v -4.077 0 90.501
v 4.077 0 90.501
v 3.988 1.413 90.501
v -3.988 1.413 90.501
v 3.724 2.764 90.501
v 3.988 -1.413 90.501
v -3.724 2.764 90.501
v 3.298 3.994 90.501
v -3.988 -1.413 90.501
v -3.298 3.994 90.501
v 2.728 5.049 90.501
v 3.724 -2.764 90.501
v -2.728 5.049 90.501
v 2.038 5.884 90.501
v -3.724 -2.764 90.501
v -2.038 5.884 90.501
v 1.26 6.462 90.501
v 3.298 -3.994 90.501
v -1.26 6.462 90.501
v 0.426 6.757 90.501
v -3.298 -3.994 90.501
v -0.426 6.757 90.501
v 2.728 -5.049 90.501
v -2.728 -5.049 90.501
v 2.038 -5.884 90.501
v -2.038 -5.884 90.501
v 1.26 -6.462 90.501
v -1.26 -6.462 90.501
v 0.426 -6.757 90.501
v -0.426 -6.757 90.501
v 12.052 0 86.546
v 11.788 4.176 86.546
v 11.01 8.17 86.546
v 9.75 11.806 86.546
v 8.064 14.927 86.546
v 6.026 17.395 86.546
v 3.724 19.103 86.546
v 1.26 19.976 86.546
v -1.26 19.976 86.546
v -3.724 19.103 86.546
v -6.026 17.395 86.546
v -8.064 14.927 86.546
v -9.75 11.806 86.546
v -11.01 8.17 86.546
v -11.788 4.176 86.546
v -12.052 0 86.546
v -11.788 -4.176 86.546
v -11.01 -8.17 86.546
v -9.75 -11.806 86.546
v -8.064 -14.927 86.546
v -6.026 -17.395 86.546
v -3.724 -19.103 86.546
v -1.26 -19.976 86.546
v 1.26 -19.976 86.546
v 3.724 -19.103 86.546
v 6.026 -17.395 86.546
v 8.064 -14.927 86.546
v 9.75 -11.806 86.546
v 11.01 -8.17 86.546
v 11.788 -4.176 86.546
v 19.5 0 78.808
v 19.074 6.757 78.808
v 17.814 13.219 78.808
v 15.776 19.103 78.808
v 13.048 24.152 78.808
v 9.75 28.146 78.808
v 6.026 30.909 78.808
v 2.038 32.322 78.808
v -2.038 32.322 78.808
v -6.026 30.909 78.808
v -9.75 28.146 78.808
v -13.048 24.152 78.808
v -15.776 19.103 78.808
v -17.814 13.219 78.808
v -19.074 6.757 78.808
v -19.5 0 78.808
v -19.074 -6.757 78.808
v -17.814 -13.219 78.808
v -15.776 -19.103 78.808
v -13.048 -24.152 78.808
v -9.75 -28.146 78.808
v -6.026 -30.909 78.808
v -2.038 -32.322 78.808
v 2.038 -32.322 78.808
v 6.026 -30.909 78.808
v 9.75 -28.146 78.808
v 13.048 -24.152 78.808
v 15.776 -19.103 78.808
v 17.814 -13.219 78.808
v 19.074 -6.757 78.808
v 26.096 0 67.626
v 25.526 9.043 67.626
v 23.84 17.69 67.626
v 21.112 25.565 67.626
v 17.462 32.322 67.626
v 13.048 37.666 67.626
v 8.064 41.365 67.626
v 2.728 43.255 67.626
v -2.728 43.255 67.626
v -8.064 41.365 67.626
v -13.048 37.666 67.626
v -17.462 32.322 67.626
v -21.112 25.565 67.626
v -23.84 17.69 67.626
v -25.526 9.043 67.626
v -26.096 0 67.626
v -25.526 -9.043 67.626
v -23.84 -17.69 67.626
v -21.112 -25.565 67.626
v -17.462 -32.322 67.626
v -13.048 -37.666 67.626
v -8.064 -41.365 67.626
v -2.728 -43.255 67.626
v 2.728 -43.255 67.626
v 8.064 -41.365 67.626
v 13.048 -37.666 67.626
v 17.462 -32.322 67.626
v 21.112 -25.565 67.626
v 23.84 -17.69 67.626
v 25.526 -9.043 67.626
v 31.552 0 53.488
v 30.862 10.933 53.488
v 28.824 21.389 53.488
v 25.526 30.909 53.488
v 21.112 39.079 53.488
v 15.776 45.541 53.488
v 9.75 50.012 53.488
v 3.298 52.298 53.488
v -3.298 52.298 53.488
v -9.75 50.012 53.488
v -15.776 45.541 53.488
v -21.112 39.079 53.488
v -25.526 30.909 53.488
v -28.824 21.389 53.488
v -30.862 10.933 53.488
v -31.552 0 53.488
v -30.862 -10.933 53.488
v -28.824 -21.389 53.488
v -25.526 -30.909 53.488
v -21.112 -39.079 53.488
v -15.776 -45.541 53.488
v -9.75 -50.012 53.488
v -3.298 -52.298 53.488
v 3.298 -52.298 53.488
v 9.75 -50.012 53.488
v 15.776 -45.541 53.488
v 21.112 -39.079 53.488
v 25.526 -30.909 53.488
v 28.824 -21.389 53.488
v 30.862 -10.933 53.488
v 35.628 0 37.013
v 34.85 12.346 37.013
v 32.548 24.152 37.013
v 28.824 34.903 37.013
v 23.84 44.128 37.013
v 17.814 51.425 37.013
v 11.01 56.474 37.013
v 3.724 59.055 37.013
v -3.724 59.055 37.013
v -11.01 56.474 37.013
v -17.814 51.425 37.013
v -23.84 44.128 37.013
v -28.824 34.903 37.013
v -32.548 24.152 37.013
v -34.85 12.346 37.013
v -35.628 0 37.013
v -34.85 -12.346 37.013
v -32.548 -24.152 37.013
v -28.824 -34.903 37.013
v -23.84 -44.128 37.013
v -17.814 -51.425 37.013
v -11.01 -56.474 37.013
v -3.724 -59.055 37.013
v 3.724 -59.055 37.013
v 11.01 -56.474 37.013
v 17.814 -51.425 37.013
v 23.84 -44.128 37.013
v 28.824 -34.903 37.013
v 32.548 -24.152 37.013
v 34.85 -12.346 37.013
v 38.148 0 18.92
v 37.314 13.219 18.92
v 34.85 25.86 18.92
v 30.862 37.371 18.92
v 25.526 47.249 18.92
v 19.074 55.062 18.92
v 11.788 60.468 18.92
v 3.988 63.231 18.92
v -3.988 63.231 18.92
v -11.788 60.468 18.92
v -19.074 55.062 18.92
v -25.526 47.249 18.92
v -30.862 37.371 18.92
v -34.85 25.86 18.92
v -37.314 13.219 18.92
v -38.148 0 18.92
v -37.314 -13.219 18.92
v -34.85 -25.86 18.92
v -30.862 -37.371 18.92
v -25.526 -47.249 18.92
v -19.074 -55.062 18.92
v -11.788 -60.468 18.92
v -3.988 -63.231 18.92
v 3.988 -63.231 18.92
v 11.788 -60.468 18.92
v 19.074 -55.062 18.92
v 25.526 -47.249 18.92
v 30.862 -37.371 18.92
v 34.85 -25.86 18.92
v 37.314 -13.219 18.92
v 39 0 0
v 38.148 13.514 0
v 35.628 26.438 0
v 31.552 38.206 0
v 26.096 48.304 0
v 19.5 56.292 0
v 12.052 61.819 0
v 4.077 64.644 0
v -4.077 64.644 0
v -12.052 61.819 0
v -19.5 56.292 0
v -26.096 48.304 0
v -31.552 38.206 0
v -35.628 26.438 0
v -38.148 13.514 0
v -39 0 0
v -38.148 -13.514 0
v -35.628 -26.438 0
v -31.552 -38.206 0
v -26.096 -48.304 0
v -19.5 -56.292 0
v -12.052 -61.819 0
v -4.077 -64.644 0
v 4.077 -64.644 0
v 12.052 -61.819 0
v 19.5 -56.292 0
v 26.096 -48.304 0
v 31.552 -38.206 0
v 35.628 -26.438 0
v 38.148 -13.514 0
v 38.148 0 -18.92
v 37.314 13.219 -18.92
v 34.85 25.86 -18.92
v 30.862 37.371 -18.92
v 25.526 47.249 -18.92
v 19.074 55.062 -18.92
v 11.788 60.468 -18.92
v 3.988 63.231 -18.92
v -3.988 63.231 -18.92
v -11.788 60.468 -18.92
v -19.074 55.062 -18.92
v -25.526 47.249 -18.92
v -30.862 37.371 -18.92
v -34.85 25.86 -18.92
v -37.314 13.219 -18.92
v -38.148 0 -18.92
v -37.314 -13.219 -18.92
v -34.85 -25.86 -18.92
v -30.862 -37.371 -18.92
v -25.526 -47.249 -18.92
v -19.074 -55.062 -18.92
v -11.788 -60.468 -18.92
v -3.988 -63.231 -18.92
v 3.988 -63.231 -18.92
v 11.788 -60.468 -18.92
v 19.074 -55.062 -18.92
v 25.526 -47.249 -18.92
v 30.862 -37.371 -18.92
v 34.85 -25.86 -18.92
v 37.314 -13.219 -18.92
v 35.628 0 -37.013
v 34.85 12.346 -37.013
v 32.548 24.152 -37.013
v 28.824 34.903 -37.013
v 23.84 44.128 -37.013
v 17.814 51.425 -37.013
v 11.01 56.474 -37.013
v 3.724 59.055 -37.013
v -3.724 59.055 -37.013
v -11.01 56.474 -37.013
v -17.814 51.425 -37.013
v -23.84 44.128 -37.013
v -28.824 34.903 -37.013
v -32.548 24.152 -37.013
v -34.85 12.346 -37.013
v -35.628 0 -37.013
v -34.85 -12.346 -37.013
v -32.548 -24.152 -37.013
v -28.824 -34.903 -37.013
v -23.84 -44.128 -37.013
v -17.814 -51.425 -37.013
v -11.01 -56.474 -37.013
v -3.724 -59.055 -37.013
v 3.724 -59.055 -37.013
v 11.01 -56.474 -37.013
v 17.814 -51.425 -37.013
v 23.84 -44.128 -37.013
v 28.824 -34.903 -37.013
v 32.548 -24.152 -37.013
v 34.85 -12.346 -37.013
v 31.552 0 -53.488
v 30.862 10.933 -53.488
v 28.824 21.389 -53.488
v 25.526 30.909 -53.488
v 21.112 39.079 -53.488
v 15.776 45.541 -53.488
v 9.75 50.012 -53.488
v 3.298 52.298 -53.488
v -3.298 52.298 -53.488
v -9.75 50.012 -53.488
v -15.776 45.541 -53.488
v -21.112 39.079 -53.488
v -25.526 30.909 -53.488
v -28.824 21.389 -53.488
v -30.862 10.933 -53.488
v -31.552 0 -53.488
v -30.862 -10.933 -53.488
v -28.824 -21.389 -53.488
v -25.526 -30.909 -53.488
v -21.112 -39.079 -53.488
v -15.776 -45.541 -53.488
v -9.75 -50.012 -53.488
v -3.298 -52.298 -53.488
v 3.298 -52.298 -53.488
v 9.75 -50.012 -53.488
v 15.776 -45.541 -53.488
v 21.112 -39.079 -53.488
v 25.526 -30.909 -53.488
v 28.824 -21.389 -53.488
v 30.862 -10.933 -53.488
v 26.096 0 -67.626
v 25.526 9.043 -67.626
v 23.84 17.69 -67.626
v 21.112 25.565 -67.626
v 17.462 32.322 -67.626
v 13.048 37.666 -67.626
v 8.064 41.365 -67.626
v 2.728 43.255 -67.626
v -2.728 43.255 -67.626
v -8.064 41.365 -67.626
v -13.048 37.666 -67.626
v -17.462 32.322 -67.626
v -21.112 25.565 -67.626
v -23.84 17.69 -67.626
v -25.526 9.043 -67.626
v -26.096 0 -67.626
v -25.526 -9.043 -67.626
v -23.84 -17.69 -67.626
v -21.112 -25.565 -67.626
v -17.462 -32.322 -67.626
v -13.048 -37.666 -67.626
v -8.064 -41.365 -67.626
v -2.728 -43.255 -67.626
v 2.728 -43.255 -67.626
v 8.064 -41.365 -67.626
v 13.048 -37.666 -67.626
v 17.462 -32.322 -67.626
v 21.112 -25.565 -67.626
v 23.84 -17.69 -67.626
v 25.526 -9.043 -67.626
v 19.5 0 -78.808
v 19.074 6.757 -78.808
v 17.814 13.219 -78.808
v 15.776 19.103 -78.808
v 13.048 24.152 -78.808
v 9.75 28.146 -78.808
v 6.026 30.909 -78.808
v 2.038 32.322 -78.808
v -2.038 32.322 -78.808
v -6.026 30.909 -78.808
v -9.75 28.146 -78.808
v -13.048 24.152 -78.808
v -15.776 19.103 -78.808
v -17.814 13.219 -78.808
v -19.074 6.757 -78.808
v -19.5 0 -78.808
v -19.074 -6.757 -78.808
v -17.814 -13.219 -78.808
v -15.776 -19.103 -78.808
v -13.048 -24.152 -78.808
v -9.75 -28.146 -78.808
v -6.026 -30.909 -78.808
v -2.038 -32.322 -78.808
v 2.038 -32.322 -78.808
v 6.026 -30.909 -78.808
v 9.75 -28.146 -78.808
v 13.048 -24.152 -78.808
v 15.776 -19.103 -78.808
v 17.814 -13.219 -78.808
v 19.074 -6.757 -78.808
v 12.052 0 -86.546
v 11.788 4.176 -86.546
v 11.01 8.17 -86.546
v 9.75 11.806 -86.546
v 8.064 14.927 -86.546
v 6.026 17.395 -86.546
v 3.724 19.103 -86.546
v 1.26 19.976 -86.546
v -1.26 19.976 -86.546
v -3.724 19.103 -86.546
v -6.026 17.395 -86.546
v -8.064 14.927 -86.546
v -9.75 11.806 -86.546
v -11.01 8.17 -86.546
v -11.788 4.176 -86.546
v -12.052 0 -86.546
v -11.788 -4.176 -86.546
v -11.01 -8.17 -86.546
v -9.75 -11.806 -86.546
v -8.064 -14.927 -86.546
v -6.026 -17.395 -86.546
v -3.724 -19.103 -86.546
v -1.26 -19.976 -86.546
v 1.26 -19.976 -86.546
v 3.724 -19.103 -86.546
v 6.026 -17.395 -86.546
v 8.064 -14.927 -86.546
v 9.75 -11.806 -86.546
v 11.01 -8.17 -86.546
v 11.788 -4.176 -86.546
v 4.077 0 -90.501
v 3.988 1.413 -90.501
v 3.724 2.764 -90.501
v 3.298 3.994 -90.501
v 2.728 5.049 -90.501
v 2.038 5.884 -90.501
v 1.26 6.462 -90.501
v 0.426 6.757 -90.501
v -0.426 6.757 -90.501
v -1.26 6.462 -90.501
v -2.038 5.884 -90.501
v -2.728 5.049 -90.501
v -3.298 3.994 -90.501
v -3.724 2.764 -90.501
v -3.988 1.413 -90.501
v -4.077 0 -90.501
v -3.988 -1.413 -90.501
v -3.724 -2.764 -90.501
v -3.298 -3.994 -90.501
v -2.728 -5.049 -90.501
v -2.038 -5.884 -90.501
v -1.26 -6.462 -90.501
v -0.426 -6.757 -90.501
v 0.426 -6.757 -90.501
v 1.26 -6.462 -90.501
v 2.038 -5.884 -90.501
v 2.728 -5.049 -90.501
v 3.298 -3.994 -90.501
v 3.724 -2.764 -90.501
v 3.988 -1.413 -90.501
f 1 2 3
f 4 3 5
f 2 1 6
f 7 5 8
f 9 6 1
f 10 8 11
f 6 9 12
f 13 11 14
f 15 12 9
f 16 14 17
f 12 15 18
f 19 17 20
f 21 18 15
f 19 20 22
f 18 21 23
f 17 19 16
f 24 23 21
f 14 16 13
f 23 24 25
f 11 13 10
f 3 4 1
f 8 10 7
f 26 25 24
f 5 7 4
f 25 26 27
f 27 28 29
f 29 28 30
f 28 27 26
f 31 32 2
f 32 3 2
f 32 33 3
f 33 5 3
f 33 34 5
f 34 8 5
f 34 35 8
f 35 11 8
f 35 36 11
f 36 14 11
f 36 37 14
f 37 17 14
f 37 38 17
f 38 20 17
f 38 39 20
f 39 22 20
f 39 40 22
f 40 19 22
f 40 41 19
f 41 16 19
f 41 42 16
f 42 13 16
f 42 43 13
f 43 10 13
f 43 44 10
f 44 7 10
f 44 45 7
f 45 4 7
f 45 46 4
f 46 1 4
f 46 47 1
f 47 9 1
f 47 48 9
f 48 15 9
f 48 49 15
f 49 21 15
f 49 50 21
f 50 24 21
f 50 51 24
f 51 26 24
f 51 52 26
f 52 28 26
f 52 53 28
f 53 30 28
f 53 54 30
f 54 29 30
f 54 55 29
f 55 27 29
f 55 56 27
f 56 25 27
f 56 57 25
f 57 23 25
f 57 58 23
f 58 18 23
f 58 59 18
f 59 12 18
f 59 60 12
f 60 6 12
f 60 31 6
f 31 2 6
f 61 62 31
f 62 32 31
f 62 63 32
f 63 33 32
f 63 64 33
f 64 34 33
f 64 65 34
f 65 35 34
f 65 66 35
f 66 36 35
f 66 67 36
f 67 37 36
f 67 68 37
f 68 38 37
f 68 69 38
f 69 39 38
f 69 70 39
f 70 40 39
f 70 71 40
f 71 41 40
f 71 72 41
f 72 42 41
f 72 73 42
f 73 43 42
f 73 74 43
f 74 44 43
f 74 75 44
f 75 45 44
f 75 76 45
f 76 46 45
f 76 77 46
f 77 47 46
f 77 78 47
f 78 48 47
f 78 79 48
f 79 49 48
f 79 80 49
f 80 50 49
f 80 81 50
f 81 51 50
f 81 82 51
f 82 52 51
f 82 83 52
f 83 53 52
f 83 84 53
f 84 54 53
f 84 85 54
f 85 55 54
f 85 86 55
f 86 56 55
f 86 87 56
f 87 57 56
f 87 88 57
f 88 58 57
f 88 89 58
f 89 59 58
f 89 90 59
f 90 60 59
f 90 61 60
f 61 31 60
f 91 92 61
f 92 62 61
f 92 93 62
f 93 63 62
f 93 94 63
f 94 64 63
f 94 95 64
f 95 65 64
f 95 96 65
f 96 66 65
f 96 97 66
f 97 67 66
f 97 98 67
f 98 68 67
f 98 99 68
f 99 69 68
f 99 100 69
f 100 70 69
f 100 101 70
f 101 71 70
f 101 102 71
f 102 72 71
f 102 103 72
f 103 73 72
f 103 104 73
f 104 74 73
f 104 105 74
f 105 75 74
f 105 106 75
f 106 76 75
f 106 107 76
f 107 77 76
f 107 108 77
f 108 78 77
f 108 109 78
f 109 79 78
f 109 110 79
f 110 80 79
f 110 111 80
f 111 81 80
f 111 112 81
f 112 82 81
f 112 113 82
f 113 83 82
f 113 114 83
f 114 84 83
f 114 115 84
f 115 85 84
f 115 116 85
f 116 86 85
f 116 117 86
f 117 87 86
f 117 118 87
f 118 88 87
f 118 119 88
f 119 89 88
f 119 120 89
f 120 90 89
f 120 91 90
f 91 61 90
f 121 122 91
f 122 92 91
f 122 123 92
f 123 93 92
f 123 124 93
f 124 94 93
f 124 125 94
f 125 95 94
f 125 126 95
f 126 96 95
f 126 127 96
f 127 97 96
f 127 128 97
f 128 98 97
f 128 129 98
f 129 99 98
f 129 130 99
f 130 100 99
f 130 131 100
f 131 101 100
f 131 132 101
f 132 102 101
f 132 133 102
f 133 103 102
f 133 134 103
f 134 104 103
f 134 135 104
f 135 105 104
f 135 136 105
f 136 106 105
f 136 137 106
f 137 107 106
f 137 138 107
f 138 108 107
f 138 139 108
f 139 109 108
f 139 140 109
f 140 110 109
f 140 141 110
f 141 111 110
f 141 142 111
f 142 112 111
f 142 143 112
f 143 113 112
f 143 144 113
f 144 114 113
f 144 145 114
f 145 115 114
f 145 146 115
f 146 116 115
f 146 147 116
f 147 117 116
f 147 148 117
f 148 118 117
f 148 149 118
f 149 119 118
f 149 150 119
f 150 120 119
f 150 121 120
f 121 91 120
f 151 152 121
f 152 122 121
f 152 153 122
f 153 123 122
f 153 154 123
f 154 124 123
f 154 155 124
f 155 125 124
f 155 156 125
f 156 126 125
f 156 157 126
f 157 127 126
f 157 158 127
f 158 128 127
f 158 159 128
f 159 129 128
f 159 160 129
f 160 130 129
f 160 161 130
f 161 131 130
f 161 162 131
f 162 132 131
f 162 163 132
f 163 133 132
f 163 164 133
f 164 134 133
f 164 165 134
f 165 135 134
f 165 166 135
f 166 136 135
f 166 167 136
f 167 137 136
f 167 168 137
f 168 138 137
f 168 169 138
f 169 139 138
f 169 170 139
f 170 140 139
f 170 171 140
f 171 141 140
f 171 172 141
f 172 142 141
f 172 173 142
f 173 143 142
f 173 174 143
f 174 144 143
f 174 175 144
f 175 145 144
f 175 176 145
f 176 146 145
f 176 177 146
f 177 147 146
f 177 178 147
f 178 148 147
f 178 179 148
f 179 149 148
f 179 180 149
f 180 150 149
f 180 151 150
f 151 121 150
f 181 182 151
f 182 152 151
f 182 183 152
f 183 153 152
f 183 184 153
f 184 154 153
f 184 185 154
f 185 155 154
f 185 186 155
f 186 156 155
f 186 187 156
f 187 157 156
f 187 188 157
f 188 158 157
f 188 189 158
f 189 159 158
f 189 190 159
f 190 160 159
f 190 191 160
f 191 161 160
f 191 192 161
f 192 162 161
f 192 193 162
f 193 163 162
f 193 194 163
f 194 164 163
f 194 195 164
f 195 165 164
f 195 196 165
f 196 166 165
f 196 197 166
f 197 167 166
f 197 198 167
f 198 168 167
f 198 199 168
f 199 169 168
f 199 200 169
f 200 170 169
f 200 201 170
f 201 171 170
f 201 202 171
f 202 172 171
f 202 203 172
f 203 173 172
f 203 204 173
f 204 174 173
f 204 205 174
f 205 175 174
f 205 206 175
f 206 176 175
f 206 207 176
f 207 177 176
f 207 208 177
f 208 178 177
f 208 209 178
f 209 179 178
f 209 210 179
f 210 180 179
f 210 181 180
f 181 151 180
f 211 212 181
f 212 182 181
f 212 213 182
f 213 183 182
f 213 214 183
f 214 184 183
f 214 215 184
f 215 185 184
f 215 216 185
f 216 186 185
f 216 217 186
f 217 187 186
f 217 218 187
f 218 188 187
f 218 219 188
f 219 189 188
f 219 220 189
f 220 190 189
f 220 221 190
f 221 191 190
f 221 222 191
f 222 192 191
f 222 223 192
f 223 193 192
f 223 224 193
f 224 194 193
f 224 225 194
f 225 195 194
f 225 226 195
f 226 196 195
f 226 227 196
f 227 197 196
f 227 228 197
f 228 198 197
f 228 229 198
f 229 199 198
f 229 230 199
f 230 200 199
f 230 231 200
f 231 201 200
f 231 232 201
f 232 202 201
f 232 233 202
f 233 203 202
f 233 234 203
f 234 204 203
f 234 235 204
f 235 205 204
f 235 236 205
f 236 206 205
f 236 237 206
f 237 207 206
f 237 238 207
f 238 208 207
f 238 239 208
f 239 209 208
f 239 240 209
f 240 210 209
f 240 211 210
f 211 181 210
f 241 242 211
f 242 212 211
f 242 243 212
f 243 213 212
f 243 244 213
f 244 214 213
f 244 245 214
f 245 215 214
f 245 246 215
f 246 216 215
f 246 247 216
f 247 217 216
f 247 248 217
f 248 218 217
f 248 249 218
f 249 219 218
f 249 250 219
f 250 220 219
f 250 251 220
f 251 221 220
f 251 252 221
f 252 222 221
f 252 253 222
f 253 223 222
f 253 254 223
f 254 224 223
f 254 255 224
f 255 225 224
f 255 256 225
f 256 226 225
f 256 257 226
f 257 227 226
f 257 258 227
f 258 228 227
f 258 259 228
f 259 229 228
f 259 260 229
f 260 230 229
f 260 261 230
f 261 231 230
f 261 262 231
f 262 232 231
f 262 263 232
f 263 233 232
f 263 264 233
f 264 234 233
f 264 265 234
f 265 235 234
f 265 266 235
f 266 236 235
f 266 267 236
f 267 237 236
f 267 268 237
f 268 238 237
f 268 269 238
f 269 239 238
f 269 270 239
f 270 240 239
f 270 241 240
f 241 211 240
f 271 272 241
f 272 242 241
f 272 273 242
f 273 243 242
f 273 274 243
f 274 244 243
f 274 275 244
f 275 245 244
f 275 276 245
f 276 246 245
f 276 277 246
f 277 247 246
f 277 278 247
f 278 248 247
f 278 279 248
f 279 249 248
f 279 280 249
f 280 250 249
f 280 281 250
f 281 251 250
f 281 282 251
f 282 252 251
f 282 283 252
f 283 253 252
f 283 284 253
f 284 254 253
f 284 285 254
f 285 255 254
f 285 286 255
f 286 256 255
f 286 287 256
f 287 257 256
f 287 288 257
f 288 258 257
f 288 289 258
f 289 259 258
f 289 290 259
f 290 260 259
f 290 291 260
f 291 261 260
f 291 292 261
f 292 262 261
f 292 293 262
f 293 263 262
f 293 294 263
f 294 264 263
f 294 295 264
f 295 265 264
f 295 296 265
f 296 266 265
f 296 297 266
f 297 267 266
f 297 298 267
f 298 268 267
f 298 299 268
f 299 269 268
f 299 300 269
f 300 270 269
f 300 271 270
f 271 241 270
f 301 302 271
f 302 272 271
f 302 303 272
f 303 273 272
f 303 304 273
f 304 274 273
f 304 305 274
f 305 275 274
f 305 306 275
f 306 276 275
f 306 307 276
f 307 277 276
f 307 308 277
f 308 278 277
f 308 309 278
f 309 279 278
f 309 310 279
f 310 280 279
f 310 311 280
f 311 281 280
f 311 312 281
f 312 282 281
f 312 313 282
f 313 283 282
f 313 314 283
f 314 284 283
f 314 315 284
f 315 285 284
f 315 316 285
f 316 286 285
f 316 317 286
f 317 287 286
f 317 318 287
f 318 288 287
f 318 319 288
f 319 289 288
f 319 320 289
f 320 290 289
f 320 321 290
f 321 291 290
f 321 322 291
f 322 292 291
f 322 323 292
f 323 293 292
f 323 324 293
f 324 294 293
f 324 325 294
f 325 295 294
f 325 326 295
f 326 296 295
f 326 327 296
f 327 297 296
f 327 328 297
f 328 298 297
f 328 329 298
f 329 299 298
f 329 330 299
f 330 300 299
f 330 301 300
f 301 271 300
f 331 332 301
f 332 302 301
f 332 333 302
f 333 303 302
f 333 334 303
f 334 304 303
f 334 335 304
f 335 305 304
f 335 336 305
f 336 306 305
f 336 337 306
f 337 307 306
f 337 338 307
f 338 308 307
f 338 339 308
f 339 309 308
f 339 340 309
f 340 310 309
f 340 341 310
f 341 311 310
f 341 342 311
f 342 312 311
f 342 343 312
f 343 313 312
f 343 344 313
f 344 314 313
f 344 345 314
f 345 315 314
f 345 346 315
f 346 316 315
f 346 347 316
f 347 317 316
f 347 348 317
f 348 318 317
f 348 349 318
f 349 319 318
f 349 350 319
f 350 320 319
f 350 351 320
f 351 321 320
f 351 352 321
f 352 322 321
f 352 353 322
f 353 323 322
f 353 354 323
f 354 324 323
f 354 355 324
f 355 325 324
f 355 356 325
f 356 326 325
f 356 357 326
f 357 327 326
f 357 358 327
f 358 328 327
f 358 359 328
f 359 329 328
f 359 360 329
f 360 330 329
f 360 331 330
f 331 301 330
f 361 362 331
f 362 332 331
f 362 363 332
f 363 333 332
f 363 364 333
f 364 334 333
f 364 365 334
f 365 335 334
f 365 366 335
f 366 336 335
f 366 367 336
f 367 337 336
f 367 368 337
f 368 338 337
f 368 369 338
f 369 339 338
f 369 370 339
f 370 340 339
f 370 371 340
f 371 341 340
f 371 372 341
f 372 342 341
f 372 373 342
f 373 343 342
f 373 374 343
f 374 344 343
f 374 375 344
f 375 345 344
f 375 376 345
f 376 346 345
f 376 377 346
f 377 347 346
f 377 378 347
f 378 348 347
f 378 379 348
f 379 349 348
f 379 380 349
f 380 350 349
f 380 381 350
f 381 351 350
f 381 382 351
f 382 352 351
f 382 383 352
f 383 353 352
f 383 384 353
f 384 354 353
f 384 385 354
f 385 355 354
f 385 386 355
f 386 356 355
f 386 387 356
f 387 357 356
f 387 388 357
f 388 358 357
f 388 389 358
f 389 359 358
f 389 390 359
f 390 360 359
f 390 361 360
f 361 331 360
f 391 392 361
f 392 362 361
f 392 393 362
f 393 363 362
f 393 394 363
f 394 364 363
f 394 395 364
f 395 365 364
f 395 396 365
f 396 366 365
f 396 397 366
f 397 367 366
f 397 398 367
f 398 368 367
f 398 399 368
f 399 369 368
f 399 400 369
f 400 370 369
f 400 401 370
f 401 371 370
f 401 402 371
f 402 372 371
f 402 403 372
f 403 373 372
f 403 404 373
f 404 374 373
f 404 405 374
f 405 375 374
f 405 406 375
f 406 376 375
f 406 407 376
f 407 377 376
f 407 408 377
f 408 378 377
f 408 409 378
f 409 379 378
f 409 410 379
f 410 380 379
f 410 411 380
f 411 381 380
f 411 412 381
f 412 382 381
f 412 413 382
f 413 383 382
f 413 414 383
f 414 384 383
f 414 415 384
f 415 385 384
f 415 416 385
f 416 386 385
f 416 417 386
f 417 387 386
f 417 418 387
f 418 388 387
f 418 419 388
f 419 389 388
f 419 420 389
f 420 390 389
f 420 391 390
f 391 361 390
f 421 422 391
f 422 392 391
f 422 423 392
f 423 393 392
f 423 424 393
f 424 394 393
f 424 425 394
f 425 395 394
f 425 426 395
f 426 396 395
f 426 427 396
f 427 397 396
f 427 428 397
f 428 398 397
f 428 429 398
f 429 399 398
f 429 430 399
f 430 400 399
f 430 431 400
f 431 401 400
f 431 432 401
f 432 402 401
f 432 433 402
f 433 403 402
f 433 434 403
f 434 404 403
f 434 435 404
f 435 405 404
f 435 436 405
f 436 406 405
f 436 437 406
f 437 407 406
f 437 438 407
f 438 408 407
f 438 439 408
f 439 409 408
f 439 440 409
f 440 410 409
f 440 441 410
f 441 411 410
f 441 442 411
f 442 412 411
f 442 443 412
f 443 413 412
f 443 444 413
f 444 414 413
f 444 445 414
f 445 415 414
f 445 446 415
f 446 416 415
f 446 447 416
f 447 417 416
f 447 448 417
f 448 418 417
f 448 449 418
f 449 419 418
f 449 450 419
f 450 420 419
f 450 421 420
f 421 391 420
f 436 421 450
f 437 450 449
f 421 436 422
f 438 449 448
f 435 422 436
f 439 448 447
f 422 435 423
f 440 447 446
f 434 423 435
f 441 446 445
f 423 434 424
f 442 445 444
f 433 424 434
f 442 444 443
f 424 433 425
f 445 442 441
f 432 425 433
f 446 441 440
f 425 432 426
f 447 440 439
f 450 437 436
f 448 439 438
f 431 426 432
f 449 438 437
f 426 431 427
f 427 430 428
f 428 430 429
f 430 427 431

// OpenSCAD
// Generated by SolidPython 1.0.1 on 2020-07-29 00:46:45


scale(v = [3, 5, 7]) {
	sphere(r = 13);
}
/***********************************************
*********      SolidPython code:      **********
************************************************
 
# import packages: SolidPython
from solid import *
from solid.utils import *
from itertools import chain, combinations, permutations


class Resize:

    def __init__(self, scad_file):
        self.scad_file = scad_file
        #self.scad_file = import_scad(scad_file)
        # cone/cylinder param:
        self.r1 = 0
        self.r2 = 0
        self.h = 0
        # rectangular prism param:
        self.w = 0
        self.l = 0
        # ellipse param:
        self.r = 0

    # import OpenScad code (file name corresponds to shape)


    # classify shape + parameters
    def assign(self, param1, param2, param3):
        if self.scad_file == 'cone.scad':
            self.r1 = param1
            self.r2 = param2
            self.h = param3
        elif self.scad_file == 'cylinder.scad':
            self.r1 = param1
            self.r2 = param2
            self.h = param3
        elif self.scad_file == 'rectangularPrism.scad':
            self.h = param1
            self.l = param2
            self.w = param3
        else:
            self.r = param1
            self.h = param2

    # resize parameters
    def iterate(self):
        x = range(3, 20, 2)
        i = 1
        if self.scad_file == 'cone.scad':
            tempList = list(permutations(x, 2))
            for temp in tempList:
                param1 = temp[0]
                param2 = temp[1]
                filepath = 'produced_scad_files/' + 'cone' + str(param1) + '_' + str(param2) + '_' + '.scad'
                scad_render_to_file(cylinder(h=param1, r1=param2, r2=0), filepath)

        elif self.scad_file == 'cylinder.scad':
            tempList = list(permutations(x, 3))
            for temp in tempList:
                param1 = temp[0]
                param2 = temp[1]
                filepath = 'produced_scad_files/' + 'cylinder' + str(param1) + '_' + str(param2) + '_' + '.scad'
                scad_render_to_file(cylinder(h=param1, r1=param2, r2=param2), filepath)

        elif self.scad_file == 'rectangularPrism.scad':
            tempList = list(permutations(x, 3))
            for temp in tempList:
                param1 = temp[0]
                param2 = temp[1]
                param3 = temp[2]
                filepath = 'produced_scad_files/' + 'rectangularPrism' + str(param1) + '_' + str(param2) + '_' + str(
                    param3) + '.scad'
                scad_render_to_file(cube(size=(param1, param2, param3)), filepath)

        elif self.scad_file == 'ellipse.scad':
            tempList = list(permutations(x, 4))
            for temp in tempList:
                param1 = temp[0]
                param2 = temp[1]
                param3 = temp[2]
                param4 = temp[3]
                filepath = 'produced_scad_files/' + 'ellipse' + str(param1) + '_' + str(param2) + '_' + str(param3) + '_' + str(param4) + '.scad'
                scad_render_to_file(scale([param1, param2, param3])(sphere(r=param4)), filepath)

    def render_to_scadfile(self):
        scad_render_to_file(scad, 'example.scad') 
 
************************************************/
